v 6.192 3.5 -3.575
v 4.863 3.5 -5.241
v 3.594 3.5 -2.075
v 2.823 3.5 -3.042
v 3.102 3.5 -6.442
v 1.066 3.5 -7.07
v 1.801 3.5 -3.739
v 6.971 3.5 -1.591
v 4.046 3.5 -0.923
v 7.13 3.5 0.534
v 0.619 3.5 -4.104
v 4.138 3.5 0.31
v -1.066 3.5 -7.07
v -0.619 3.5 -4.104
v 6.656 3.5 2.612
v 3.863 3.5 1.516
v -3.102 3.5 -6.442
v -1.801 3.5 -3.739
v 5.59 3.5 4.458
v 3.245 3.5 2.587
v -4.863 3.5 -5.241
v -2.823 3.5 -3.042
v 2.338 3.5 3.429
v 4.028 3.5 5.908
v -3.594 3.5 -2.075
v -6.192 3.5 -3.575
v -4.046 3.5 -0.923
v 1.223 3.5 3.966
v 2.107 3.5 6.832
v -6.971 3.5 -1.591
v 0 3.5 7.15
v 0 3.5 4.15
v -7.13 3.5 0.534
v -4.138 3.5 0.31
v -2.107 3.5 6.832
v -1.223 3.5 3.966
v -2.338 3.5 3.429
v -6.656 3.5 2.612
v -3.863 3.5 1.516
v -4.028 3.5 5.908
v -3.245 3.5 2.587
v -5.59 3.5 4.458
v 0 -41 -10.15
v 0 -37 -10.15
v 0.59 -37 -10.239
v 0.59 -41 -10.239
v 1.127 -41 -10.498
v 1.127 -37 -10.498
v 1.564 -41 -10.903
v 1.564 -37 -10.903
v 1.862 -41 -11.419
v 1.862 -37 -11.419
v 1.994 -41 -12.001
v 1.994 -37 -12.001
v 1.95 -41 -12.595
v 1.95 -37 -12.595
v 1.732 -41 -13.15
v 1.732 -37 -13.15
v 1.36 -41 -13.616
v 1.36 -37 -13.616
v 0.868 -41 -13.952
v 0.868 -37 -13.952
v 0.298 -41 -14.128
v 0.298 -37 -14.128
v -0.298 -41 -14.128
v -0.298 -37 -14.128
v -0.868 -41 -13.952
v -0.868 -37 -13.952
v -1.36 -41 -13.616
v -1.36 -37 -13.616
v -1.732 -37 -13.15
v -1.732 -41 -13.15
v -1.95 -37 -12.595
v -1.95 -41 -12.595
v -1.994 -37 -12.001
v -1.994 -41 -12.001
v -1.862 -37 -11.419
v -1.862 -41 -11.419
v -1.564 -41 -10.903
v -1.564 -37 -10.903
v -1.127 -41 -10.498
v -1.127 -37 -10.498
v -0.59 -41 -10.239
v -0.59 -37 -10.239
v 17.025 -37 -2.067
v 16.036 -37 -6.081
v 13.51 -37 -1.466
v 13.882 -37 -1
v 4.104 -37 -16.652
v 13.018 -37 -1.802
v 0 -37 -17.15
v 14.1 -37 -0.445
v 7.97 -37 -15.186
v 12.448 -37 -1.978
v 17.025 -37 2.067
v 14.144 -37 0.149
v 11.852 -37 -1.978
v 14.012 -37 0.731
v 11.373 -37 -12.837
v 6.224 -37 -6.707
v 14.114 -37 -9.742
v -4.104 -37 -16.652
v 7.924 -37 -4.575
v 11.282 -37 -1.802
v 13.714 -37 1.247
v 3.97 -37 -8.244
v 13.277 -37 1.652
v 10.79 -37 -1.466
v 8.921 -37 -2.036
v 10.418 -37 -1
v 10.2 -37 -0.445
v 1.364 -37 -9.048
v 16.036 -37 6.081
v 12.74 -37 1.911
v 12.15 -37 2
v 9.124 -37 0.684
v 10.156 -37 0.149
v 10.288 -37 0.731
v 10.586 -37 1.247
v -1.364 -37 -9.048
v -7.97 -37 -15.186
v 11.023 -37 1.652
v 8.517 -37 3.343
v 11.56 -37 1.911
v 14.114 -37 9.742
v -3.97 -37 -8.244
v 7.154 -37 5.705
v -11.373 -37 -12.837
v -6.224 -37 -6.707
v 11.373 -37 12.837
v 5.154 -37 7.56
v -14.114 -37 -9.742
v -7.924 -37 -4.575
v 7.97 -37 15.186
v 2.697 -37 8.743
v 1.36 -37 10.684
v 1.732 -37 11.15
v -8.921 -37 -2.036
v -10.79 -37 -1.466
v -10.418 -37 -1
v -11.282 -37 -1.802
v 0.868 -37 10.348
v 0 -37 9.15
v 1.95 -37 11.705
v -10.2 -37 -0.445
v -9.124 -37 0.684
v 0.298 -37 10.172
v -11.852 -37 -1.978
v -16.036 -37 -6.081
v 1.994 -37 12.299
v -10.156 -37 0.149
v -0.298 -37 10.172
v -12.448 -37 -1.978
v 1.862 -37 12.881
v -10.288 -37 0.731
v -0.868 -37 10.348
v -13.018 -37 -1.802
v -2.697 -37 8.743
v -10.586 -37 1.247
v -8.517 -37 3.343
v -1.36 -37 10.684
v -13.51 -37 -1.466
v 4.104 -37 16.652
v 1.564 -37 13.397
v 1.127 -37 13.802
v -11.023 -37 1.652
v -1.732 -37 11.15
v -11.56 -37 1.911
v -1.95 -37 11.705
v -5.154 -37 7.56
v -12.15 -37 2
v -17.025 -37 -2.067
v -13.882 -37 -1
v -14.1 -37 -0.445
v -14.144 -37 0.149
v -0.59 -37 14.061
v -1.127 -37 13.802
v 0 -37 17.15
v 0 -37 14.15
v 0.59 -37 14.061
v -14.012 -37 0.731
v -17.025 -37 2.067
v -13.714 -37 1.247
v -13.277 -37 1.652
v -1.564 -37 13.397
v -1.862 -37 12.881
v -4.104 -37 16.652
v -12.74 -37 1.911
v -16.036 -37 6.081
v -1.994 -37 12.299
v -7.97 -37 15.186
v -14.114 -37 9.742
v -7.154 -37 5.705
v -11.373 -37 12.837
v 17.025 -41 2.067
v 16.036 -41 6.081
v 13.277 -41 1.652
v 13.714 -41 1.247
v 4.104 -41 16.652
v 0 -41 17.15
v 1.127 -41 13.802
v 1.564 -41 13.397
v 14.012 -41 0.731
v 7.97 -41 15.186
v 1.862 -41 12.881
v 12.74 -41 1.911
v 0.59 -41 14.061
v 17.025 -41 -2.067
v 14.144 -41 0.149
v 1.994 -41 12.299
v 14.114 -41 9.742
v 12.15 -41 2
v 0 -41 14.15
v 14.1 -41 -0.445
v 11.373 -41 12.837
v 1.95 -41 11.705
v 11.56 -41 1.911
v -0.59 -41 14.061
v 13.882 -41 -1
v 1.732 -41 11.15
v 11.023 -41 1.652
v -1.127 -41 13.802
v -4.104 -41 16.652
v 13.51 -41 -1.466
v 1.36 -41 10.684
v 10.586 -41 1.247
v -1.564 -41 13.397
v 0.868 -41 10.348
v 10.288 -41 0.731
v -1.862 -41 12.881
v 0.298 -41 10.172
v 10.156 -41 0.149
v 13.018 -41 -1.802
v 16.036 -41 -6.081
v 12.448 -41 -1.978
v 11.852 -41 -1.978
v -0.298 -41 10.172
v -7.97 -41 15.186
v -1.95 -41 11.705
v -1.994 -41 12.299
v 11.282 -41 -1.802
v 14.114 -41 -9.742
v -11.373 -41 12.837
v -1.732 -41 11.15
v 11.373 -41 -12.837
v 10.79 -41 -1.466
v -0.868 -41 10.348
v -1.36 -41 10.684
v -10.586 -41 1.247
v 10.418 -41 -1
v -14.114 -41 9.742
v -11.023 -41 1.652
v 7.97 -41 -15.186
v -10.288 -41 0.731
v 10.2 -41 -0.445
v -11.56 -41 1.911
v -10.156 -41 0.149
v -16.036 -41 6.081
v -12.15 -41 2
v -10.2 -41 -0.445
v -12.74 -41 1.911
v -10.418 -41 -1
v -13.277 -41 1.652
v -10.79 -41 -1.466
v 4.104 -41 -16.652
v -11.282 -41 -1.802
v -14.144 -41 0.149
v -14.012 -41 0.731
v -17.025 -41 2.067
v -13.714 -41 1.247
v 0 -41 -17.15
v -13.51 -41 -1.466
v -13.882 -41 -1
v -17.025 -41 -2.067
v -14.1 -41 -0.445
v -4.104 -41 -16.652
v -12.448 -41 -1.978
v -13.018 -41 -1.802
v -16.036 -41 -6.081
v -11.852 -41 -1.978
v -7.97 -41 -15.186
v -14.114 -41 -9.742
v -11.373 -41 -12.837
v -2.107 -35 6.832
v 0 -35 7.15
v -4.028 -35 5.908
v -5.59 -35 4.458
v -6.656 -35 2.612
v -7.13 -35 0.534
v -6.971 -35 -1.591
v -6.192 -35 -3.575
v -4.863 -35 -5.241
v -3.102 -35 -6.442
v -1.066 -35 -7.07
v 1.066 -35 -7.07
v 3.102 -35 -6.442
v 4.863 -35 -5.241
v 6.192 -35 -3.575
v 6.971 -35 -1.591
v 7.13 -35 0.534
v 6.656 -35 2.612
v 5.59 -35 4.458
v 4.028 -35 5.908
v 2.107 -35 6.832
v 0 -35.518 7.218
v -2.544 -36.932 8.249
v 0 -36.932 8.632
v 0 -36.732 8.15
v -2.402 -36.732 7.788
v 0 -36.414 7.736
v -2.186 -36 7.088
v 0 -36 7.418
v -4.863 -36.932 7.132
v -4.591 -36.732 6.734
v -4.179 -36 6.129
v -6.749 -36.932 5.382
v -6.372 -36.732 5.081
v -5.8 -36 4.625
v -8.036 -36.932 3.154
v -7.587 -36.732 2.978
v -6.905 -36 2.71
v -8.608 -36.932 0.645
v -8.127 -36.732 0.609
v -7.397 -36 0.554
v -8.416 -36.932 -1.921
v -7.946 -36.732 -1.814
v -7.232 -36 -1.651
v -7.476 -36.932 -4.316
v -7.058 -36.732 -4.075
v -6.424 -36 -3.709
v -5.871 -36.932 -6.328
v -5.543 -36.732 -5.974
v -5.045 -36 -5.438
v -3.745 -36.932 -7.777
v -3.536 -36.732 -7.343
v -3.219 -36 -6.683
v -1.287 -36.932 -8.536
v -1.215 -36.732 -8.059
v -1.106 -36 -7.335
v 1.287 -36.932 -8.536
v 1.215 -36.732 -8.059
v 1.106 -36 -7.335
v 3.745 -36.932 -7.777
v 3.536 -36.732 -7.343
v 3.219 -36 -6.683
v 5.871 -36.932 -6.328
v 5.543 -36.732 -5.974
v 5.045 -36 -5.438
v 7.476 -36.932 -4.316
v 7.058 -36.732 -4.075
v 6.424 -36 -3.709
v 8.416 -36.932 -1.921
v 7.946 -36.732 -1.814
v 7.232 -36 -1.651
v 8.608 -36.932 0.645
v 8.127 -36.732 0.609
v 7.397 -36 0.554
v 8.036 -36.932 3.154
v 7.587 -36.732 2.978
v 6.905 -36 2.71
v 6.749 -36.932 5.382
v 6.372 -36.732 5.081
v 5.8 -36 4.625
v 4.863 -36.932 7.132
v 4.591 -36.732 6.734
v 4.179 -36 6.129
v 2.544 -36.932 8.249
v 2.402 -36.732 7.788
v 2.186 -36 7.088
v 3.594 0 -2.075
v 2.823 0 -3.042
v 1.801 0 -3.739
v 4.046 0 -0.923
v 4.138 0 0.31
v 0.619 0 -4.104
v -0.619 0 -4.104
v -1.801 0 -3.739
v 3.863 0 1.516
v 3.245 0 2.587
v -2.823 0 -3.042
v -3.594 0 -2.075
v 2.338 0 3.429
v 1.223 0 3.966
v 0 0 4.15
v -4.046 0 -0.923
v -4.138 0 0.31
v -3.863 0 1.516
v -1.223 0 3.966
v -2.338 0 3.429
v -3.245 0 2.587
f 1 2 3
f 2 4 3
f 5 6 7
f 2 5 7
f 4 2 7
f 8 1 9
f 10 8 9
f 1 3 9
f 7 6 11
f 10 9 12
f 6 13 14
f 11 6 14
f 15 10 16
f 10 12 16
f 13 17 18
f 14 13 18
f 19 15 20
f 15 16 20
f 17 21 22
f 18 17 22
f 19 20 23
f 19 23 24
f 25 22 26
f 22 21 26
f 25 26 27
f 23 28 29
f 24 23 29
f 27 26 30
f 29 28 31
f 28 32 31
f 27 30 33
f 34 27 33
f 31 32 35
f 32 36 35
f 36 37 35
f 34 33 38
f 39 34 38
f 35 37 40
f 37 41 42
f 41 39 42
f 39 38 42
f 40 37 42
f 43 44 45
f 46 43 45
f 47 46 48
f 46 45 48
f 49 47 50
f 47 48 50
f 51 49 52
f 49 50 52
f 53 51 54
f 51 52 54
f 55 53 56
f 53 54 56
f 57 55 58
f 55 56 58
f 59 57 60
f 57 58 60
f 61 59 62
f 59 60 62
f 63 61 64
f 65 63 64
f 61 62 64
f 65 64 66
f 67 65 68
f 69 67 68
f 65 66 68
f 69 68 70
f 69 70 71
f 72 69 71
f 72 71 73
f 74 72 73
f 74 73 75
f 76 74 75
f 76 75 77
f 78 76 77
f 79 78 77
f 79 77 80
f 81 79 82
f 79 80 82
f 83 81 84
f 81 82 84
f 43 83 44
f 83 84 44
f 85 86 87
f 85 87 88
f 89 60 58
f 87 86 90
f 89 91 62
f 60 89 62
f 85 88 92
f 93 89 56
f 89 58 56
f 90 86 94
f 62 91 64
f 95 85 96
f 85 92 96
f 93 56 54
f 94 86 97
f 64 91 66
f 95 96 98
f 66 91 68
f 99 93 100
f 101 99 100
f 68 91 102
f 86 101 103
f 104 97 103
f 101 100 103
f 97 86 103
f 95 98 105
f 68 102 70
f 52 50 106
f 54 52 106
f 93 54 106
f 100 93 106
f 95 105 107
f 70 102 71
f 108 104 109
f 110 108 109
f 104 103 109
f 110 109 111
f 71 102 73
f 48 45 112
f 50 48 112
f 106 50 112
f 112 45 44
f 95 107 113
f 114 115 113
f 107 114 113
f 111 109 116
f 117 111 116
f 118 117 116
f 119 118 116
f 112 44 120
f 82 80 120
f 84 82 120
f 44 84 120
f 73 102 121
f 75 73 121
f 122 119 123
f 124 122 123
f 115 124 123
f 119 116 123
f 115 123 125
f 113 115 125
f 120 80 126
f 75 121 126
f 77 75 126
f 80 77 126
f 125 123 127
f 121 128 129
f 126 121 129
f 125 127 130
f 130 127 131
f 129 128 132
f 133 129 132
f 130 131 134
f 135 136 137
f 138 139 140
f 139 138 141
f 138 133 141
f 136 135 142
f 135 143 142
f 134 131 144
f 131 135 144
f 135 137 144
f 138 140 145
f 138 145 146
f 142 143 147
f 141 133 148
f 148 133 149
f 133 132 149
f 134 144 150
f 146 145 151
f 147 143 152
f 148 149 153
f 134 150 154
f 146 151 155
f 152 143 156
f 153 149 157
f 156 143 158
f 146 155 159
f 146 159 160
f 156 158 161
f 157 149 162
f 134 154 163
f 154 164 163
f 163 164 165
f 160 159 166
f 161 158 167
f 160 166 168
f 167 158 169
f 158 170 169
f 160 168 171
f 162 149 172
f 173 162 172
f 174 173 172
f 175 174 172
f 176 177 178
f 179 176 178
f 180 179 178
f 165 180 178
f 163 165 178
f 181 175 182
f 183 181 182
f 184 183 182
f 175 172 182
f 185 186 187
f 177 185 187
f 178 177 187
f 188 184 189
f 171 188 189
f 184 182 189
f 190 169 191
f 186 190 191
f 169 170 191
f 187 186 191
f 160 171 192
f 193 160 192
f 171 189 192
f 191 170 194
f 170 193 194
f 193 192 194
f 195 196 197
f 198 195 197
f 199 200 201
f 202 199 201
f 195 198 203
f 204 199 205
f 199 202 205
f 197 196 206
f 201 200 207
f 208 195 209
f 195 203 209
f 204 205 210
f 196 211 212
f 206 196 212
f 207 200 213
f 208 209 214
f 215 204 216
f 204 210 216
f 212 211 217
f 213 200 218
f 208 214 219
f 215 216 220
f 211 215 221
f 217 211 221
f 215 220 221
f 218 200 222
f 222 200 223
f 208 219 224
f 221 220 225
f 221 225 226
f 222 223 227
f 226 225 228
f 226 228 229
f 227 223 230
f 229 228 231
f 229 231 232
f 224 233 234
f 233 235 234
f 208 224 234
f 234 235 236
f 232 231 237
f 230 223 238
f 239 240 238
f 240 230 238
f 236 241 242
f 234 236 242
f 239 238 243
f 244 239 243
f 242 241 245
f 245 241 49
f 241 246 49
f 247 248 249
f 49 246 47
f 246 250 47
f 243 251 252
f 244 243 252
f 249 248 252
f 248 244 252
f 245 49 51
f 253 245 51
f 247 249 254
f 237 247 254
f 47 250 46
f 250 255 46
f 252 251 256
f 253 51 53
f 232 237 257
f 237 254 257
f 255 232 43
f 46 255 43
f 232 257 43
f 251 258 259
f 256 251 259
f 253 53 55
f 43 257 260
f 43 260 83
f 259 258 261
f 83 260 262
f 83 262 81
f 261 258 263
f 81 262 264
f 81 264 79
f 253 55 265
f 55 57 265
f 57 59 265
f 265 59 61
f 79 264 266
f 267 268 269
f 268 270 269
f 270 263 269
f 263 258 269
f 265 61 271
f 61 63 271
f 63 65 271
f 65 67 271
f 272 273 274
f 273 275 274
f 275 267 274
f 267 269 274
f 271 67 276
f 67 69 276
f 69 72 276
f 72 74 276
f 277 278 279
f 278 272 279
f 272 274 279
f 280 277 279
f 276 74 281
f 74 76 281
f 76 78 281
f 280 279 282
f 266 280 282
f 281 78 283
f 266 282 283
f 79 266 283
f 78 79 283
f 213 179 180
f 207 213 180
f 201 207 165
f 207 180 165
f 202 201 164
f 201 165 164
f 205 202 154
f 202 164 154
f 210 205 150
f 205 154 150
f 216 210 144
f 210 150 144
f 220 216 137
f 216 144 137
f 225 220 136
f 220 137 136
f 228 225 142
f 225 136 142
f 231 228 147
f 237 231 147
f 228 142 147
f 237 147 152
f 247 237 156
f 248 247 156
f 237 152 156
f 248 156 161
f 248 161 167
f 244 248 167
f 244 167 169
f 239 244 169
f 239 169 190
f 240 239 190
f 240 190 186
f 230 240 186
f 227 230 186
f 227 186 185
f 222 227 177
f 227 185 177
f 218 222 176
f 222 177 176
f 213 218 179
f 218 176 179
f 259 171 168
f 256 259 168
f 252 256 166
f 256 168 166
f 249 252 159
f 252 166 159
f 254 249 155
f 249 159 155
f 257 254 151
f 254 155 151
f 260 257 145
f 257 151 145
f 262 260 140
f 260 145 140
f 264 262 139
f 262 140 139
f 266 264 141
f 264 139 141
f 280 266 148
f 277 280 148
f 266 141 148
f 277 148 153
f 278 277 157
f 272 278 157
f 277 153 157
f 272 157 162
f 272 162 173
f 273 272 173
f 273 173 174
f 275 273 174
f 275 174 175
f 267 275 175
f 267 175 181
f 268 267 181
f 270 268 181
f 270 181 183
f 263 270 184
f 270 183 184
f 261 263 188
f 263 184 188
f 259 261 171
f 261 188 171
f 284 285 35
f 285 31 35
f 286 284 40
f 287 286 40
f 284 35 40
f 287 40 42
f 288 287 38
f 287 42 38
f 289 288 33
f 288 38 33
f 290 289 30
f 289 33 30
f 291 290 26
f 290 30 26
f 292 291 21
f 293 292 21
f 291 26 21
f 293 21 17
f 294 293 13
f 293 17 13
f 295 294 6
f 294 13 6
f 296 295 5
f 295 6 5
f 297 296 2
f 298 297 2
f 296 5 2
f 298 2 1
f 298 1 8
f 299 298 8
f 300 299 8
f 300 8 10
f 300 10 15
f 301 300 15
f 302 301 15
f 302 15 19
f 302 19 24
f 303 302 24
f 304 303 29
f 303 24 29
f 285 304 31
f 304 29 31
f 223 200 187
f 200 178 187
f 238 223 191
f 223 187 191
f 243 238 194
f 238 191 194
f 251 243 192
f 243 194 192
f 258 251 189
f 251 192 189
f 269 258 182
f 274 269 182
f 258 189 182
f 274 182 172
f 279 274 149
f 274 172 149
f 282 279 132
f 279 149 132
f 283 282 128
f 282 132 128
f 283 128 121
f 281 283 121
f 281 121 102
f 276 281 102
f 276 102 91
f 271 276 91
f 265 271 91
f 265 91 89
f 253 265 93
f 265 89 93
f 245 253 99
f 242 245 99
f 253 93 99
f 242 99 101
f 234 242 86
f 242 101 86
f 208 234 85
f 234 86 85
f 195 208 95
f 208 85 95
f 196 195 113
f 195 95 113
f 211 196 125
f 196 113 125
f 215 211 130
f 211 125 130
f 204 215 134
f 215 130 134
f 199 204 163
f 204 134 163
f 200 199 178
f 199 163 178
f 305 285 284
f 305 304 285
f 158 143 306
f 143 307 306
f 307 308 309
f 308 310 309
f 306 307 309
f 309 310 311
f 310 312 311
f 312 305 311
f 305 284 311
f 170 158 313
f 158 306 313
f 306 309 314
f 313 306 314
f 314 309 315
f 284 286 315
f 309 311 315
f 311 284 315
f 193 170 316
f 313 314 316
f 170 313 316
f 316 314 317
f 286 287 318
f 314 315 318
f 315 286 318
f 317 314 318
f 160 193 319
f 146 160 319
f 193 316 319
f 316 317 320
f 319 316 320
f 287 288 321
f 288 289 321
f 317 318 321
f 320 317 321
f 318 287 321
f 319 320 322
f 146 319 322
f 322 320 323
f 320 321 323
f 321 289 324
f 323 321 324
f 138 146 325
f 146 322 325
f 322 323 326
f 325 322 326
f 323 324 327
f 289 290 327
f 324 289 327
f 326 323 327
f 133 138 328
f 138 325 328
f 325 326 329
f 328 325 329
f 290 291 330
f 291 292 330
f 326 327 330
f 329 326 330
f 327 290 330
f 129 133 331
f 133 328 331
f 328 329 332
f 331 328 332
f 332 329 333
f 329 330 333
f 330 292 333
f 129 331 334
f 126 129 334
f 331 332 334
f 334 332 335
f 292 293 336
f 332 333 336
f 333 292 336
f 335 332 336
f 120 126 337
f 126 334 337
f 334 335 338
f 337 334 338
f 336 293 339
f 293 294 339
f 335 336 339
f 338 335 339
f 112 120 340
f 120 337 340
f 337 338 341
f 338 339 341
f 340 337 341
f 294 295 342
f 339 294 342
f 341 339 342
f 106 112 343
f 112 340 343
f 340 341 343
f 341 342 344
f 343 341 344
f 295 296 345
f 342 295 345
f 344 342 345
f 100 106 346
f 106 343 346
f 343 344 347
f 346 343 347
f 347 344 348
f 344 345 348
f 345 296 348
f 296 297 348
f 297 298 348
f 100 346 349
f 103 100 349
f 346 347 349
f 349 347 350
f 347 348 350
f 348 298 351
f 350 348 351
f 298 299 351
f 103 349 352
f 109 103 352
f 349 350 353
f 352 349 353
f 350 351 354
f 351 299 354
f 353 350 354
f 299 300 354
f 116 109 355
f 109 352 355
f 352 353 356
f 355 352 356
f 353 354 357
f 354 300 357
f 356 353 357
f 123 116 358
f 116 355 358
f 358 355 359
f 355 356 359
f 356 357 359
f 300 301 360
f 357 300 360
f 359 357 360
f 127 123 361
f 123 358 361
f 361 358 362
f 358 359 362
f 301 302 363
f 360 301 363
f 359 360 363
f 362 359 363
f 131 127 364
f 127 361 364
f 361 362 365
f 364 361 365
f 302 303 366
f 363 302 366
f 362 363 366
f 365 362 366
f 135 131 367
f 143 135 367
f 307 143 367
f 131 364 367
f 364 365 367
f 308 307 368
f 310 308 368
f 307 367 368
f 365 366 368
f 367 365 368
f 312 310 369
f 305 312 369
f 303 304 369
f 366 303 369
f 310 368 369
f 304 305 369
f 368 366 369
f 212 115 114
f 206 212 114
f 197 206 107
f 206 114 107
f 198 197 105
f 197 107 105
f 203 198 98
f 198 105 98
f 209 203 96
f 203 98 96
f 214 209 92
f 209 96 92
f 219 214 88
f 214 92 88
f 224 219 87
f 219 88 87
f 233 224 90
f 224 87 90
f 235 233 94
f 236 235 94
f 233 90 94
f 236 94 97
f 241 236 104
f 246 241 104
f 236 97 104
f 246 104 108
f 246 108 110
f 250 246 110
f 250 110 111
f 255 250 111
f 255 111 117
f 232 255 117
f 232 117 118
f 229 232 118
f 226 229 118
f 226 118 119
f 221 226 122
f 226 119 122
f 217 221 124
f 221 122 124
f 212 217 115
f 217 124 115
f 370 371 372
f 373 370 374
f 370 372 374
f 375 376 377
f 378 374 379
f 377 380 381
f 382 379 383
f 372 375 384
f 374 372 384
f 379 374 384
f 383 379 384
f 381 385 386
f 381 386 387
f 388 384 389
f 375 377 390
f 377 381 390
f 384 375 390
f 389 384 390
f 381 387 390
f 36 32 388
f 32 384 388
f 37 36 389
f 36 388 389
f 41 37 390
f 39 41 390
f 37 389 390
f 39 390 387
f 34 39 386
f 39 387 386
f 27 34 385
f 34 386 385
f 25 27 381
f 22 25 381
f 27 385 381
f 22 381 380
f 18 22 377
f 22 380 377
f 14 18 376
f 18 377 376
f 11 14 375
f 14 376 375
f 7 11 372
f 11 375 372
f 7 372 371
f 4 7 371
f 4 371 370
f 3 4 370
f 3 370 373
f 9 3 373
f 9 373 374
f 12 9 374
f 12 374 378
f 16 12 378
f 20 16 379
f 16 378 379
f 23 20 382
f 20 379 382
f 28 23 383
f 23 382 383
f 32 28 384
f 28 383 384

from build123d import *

# Parameters (mm, degrees)
SKETCH2_R          = 2
CUT_EXTRUDE1_DEPTH = 4


with BuildPart() as part:
    # Sketch1 → Revolve1 (revolve)
    with BuildSketch(Plane(origin=(0, 0, 0), x_dir=(0, 0, -1), z_dir=(1, 0, 0))):
        with BuildLine():
            Line((-7.15, 3.5), (-4.15, 3.5))
            Line((-4.15, 3.5), (-4.15, 0))
            Line((-4.15, 0), (0, 0))
            Line((0, 0), (0, -41))
            Line((0, -41), (-17.15, -41))
            Line((-17.15, -41), (-17.15, -37))
            Line((-17.15, -37), (-9.15, -37))
            ThreePointArc((-9.15, -37), (-7.735786438, -36.414213562), (-7.15, -35))
            Line((-7.15, -35), (-7.15, 3.5))
        make_face()
    revolve(axis=Axis((0, 0, 0), (0, -1, 0)))

    # Sketch2 → Cut-Extrude1 (cut)
    with BuildSketch(Plane(origin=(0, -37, 0), x_dir=(1, 0, 0), z_dir=(0, 1, 0))):
        with Locations(Location((0, 12.15, 0), (0, 0, 270))):
            Circle(SKETCH2_R)
        with Locations(Location((12.15, 0, 0), (0, 0, 270))):
            Circle(SKETCH2_R)
        with Locations(Location((0, -12.15, 0), (0, 0, 270))):
            Circle(SKETCH2_R)
        with Locations(Location((-12.15, 0, 0), (0, 0, 270))):
            Circle(SKETCH2_R)
    extrude(amount=-CUT_EXTRUDE1_DEPTH, mode=Mode.SUBTRACT)


solid = part.part
